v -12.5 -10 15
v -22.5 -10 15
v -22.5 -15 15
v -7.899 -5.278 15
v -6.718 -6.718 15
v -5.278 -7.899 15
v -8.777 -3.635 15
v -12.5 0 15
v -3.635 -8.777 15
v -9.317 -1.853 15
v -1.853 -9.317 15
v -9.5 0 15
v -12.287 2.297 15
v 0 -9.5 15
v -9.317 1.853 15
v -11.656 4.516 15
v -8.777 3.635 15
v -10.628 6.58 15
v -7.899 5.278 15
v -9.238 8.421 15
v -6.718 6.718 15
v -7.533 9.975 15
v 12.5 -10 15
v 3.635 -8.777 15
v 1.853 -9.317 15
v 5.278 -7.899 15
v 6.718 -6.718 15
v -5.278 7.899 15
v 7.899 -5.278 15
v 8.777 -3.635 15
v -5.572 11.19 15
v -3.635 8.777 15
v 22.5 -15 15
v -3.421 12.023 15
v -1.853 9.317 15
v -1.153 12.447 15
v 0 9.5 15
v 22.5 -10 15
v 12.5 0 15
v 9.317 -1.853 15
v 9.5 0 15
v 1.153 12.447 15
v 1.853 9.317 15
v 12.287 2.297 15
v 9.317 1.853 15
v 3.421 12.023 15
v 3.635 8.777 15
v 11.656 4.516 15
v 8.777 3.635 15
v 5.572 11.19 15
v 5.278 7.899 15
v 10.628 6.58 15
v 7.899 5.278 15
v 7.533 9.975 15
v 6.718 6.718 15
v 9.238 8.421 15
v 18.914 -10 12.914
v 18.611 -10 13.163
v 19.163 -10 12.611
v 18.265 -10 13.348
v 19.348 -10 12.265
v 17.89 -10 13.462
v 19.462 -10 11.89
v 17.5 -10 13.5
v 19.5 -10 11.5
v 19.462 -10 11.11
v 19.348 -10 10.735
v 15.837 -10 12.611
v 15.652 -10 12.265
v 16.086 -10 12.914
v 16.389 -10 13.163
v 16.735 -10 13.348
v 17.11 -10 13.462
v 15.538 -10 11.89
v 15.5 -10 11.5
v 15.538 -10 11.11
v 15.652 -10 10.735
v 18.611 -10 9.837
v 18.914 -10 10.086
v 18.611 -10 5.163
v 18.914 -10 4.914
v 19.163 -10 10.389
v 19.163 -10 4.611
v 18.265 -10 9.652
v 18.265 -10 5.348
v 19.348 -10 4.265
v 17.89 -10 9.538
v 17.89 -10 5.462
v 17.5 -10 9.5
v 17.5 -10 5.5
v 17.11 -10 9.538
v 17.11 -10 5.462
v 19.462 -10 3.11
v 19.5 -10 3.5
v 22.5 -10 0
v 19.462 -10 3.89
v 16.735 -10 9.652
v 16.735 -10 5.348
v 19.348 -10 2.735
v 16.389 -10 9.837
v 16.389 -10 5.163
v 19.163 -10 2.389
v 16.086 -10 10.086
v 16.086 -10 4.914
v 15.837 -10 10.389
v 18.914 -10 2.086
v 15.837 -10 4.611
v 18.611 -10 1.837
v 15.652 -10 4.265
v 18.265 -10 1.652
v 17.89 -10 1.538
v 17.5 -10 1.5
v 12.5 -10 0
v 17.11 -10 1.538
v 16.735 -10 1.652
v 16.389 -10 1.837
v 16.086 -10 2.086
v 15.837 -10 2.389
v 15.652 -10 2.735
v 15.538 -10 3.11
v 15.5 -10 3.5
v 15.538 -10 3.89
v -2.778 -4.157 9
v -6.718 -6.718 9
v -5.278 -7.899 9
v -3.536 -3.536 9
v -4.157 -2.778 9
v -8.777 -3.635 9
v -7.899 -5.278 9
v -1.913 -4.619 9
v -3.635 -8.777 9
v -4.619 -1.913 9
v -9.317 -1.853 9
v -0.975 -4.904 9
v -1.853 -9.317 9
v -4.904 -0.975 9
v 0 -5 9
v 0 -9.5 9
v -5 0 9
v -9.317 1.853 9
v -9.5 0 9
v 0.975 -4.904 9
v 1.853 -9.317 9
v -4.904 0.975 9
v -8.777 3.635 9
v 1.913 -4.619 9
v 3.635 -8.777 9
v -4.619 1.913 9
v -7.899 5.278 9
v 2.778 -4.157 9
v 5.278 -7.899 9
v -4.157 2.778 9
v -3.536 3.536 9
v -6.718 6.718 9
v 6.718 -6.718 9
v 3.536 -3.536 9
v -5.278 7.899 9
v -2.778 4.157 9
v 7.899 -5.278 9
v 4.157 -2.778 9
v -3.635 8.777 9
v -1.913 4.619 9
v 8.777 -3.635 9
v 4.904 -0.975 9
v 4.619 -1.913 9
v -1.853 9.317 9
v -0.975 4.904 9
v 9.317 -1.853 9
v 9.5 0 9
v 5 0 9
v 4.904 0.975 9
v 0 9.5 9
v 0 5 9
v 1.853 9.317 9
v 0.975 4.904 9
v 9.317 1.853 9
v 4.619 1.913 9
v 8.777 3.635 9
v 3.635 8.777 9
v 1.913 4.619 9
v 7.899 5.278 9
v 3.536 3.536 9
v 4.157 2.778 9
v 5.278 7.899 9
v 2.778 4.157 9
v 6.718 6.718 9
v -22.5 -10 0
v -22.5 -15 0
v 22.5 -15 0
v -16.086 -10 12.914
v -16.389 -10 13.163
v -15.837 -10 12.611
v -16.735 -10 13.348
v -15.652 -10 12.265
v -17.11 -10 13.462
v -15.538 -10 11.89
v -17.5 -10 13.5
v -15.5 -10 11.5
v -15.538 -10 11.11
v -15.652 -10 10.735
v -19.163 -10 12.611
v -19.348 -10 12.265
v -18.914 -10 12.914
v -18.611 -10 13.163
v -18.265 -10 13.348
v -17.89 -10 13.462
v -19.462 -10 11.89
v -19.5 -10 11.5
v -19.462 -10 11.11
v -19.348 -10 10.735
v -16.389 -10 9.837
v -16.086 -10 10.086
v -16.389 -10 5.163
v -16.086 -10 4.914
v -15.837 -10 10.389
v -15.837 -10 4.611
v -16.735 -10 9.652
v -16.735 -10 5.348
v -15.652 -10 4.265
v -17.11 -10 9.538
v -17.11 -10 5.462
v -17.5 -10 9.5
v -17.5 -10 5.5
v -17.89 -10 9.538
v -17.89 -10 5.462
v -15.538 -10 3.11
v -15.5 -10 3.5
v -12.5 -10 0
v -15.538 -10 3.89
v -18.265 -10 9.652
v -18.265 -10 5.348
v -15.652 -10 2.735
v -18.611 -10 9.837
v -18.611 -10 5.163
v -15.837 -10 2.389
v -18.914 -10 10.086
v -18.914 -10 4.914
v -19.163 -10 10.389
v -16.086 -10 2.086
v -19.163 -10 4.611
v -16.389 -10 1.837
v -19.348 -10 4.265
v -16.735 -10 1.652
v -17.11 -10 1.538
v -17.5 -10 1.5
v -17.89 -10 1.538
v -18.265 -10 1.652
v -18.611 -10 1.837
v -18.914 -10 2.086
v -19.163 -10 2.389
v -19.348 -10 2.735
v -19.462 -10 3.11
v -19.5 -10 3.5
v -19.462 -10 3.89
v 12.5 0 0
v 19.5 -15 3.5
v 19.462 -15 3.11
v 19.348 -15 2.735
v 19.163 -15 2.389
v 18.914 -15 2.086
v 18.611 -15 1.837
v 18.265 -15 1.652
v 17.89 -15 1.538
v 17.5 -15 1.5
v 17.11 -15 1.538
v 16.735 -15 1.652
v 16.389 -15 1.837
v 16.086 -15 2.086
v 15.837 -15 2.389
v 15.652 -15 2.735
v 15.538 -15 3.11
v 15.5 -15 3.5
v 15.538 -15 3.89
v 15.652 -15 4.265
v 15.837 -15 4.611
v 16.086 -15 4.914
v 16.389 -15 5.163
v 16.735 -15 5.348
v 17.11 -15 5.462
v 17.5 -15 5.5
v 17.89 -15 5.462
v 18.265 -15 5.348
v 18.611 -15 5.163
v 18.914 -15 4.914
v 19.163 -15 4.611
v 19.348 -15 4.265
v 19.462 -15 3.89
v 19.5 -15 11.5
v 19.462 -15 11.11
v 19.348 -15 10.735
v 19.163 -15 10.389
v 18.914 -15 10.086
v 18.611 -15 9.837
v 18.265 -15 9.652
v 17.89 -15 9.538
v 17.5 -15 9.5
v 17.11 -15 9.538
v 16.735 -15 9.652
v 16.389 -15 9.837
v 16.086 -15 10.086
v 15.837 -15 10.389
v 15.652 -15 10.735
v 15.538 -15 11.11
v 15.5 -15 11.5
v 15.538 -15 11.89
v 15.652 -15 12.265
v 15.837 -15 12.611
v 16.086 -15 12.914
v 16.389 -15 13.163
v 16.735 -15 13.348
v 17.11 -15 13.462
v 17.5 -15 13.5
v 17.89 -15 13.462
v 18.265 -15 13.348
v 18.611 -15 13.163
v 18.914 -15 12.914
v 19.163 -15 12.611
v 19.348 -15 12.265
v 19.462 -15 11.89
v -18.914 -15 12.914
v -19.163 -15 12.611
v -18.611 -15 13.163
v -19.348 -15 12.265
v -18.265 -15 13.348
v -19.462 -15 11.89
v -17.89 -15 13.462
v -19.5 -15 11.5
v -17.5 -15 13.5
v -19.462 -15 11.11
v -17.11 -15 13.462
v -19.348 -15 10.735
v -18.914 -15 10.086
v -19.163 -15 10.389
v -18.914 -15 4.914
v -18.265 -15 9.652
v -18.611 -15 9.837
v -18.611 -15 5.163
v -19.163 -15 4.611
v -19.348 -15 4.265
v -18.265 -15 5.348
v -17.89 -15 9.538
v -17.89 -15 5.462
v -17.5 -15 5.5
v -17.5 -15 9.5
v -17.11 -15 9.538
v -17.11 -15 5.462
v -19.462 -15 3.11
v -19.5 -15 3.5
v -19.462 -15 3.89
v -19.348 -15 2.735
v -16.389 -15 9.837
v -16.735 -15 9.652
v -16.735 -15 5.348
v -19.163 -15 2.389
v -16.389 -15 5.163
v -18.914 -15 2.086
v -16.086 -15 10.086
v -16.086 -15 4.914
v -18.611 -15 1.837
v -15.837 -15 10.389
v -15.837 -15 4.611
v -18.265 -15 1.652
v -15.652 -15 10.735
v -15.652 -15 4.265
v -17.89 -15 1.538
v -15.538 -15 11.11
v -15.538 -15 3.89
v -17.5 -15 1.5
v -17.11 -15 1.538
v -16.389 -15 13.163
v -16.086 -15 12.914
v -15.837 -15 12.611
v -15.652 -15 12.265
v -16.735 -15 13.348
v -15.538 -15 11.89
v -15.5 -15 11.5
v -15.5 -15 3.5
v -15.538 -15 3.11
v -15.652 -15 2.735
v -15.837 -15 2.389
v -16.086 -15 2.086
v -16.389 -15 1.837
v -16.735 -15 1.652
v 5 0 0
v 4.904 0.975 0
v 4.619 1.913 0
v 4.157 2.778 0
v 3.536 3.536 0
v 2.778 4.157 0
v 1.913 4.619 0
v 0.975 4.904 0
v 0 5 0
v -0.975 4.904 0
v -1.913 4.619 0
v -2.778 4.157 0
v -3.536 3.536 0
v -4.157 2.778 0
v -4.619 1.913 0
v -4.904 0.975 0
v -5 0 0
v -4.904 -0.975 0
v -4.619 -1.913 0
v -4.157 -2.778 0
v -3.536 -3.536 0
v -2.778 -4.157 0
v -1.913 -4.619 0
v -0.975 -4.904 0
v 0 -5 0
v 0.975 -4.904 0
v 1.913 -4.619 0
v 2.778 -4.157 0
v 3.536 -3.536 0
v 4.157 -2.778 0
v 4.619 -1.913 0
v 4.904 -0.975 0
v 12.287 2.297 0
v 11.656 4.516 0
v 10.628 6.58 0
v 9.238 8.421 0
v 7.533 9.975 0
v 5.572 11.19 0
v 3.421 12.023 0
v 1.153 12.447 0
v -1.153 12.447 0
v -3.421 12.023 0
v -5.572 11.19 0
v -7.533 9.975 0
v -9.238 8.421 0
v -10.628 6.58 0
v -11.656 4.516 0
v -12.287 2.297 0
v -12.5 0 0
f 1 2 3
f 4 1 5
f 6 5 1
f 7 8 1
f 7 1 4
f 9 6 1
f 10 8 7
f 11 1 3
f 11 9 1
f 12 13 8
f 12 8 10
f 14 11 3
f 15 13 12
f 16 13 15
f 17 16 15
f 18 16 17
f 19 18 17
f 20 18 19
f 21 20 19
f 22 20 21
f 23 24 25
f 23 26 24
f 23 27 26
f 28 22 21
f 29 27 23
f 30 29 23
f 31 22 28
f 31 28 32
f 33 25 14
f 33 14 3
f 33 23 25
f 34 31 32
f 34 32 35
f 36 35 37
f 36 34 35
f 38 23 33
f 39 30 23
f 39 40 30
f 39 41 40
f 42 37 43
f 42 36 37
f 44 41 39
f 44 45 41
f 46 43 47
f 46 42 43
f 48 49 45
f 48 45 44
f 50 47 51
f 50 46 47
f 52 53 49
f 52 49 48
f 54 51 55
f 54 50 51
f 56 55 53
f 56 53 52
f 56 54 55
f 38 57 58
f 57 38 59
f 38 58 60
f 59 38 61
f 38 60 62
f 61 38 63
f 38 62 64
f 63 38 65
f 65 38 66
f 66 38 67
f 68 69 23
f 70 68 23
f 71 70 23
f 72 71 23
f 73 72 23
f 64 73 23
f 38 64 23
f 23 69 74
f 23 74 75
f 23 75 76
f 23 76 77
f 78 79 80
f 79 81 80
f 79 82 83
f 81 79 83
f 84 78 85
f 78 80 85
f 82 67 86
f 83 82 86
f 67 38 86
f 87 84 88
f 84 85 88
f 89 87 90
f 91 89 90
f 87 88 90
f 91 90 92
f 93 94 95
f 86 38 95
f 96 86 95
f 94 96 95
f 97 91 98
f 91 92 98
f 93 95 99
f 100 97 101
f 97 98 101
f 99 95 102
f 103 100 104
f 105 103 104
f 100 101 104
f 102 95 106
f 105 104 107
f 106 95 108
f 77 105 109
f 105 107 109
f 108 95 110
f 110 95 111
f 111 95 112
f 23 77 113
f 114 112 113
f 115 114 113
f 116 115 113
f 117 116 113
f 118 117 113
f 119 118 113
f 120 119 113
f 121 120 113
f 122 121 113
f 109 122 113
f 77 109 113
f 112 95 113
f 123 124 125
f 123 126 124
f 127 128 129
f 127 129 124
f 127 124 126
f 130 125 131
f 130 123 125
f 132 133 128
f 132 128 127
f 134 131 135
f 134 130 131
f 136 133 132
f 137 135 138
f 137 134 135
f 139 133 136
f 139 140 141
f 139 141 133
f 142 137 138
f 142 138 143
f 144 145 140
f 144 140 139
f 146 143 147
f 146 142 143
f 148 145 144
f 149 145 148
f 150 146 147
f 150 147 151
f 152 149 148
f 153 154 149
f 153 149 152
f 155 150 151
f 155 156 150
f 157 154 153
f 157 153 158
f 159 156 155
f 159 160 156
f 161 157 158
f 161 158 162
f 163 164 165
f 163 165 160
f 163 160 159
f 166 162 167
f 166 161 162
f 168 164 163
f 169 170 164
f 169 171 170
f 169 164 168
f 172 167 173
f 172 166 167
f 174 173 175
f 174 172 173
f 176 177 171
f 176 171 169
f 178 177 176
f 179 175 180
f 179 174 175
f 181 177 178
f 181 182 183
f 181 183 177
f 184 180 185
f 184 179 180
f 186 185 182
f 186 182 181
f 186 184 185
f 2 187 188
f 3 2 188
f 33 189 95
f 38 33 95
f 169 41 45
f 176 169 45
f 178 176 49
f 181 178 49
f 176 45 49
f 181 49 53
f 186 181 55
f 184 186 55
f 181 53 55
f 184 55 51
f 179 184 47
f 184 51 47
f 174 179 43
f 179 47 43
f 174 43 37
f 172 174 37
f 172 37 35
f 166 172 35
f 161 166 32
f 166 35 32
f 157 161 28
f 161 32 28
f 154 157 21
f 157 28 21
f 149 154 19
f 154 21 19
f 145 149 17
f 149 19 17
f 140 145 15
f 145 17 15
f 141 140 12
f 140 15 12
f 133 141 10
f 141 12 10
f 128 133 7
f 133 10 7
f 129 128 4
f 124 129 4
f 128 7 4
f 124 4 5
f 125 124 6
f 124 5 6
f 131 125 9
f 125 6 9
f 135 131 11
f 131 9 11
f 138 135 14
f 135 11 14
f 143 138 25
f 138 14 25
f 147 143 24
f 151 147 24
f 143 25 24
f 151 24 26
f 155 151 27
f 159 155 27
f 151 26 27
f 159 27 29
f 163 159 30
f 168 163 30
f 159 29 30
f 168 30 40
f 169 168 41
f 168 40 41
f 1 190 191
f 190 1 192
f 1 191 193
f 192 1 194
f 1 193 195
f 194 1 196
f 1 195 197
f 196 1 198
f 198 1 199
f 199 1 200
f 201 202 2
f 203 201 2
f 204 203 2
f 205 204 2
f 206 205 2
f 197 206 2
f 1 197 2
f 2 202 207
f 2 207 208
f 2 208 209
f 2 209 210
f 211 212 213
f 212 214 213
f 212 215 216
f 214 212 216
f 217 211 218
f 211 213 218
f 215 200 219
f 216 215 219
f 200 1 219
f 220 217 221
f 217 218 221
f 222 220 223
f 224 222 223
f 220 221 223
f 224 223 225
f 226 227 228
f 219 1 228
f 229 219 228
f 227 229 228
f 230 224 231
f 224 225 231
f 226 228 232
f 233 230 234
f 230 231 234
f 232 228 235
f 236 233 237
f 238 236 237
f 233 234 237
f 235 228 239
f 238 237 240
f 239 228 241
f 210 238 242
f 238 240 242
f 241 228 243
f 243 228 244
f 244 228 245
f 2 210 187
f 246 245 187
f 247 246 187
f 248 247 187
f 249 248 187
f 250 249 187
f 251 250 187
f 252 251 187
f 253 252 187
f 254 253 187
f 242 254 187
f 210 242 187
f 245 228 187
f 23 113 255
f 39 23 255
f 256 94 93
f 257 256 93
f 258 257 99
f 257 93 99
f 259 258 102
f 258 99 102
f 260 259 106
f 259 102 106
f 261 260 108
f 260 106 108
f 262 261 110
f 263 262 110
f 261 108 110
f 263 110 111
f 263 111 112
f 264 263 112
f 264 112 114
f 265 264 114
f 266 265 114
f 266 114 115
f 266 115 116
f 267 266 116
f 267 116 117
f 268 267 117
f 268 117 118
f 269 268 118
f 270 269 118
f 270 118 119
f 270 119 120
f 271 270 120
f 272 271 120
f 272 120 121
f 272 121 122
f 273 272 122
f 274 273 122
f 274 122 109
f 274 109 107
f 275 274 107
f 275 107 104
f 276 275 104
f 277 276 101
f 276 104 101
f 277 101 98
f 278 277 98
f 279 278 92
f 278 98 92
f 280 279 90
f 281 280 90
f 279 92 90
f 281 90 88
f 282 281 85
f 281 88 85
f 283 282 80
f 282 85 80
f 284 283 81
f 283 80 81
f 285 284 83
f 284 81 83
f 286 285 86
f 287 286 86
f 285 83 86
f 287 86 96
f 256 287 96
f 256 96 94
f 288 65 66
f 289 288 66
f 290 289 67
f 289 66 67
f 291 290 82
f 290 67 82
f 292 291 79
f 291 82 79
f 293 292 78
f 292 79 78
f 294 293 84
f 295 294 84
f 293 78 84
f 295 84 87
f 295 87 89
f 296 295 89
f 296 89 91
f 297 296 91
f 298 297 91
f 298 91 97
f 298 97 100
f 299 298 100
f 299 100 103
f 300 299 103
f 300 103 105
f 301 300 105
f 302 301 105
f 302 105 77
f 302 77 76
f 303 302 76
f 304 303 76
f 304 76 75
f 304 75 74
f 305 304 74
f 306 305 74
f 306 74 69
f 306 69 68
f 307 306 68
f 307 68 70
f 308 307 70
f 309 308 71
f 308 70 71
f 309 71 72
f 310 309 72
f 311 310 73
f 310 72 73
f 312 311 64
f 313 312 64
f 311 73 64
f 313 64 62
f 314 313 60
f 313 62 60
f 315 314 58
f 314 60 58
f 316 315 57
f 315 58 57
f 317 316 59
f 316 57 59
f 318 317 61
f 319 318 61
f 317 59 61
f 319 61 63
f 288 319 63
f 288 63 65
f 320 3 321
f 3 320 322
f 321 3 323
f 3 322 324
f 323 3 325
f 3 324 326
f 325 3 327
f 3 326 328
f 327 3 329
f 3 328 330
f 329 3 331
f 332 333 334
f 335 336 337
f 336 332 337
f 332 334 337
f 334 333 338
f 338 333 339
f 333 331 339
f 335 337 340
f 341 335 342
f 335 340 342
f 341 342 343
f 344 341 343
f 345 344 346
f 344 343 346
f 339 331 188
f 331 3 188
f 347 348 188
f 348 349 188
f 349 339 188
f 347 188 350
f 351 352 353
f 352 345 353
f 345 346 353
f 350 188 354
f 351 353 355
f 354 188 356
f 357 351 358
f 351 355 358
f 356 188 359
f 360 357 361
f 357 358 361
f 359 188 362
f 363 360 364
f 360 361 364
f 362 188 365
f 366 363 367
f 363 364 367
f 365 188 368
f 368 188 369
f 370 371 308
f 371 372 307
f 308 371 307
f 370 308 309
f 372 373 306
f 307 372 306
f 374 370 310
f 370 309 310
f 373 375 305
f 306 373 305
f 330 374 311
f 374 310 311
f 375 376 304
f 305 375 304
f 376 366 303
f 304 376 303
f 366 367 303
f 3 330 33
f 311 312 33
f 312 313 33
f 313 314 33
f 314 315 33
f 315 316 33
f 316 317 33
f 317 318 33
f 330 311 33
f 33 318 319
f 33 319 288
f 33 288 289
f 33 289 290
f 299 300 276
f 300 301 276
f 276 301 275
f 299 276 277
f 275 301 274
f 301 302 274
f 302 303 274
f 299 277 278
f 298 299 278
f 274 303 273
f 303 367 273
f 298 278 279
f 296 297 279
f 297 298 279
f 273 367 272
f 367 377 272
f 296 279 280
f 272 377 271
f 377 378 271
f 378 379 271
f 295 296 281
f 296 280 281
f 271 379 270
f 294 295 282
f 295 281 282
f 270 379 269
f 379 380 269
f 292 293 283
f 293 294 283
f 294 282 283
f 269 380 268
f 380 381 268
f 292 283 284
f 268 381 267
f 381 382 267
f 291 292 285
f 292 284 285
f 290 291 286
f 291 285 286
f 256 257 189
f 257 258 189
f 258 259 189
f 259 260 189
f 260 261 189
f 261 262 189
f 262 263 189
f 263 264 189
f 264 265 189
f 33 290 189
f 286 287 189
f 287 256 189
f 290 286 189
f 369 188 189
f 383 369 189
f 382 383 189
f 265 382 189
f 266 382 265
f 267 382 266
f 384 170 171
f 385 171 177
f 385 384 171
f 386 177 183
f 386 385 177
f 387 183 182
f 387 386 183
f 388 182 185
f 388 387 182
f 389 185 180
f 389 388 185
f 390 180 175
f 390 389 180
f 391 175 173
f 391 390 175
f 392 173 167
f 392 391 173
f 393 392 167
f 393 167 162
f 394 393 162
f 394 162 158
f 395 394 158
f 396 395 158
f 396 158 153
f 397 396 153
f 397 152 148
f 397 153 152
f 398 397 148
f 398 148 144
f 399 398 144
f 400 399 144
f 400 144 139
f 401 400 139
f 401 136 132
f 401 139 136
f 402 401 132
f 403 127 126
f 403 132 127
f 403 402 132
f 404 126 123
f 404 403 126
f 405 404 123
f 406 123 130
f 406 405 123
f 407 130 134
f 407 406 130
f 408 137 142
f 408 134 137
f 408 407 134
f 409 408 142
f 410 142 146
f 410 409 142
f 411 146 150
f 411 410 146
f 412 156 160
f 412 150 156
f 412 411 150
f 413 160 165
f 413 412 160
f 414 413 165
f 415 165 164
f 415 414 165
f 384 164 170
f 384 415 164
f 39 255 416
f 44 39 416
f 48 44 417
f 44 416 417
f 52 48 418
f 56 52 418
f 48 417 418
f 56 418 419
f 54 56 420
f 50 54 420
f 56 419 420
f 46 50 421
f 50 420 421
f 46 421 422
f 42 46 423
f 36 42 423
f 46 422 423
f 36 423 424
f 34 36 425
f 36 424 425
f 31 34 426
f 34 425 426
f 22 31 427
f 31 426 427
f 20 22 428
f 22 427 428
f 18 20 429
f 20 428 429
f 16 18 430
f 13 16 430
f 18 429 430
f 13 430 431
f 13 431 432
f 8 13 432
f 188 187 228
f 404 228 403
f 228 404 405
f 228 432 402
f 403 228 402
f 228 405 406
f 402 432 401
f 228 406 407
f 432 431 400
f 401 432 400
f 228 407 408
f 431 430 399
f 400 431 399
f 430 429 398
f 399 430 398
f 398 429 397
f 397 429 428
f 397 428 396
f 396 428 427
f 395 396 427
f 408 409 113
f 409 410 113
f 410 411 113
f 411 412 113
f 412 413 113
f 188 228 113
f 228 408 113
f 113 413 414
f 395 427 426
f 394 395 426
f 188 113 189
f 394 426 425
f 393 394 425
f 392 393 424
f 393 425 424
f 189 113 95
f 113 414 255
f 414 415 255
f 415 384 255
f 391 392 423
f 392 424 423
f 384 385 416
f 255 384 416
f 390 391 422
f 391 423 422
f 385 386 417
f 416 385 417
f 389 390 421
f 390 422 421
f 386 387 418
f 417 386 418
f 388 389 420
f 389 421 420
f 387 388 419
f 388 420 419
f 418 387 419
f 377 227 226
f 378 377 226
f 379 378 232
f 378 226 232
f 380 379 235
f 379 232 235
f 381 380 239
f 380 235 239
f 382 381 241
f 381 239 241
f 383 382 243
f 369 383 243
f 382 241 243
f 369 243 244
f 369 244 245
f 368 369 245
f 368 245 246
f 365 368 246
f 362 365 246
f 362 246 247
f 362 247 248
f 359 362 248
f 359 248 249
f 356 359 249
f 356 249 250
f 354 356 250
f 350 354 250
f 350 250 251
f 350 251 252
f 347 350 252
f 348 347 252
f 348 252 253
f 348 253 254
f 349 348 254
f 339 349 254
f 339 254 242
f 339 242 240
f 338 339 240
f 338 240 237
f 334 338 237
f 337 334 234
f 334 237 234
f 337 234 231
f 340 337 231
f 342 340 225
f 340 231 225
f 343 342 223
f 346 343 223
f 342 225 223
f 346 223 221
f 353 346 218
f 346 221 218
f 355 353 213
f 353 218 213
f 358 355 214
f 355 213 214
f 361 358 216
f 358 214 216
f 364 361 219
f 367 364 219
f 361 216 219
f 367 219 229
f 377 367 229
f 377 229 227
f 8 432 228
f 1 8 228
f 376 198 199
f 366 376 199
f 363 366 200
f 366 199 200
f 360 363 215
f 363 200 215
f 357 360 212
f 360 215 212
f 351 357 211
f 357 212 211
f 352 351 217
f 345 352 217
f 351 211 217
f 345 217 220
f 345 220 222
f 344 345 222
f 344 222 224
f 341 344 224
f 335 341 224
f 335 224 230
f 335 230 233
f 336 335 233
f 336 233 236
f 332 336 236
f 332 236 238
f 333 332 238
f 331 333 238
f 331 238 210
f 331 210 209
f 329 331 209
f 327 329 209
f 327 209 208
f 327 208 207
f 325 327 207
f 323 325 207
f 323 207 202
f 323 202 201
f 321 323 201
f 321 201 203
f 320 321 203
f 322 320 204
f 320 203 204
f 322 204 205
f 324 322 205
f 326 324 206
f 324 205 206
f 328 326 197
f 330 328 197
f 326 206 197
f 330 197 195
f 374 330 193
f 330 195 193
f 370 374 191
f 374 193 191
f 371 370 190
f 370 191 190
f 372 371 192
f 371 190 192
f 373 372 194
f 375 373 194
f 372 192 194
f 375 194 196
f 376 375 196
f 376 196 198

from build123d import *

# Parameters (mm, degrees)
SKETCH1_R           = 5
BOSS_EXTRUDE1_DEPTH = 15
SKETCH2_R           = 9.5
CUT_EXTRUDE1_DEPTH  = 6
SKETCH3_R           = 2
CUT_EXTRUDE2_DEPTH  = 6


with BuildPart() as part:
    # Sketch1 → Boss-Extrude1 (new body)
    with BuildSketch(Plane.XY):
        with BuildLine():
            Line((-12.5, 0), (-12.5, -10))
            Line((-12.5, -10), (-22.5, -10))
            Line((-22.5, -10), (-22.5, -15))
            Line((-22.5, -15), (22.5, -15))
            Line((22.5, -15), (22.5, -10))
            Line((22.5, -10), (12.5, -10))
            Line((12.5, -10), (12.5, 0))
            ThreePointArc((12.5, 0), (0, 12.5), (-12.5, 0))
        make_face()
        Circle(SKETCH1_R, mode=Mode.SUBTRACT)
    extrude(amount=BOSS_EXTRUDE1_DEPTH)

    # Sketch2 → Cut-Extrude1 (cut)
    with BuildSketch(Plane.XY.offset(15)):
        Circle(SKETCH2_R)
    extrude(amount=-CUT_EXTRUDE1_DEPTH, mode=Mode.SUBTRACT)

    # Sketch3 → Cut-Extrude2 (cut)
    with BuildSketch(Plane(origin=(0, -10, 0), x_dir=(1, 0, 0), z_dir=(0, 1, 0))):
        with Locations((17.5, -3.5)):
            Circle(SKETCH3_R)
        with Locations((17.5, -11.5)):
            Circle(SKETCH3_R)
        with Locations((-17.5, -11.5)):
            Circle(SKETCH3_R)
        with Locations((-17.5, -3.5)):
            Circle(SKETCH3_R)
    extrude(amount=-CUT_EXTRUDE2_DEPTH, mode=Mode.SUBTRACT)


solid = part.part
